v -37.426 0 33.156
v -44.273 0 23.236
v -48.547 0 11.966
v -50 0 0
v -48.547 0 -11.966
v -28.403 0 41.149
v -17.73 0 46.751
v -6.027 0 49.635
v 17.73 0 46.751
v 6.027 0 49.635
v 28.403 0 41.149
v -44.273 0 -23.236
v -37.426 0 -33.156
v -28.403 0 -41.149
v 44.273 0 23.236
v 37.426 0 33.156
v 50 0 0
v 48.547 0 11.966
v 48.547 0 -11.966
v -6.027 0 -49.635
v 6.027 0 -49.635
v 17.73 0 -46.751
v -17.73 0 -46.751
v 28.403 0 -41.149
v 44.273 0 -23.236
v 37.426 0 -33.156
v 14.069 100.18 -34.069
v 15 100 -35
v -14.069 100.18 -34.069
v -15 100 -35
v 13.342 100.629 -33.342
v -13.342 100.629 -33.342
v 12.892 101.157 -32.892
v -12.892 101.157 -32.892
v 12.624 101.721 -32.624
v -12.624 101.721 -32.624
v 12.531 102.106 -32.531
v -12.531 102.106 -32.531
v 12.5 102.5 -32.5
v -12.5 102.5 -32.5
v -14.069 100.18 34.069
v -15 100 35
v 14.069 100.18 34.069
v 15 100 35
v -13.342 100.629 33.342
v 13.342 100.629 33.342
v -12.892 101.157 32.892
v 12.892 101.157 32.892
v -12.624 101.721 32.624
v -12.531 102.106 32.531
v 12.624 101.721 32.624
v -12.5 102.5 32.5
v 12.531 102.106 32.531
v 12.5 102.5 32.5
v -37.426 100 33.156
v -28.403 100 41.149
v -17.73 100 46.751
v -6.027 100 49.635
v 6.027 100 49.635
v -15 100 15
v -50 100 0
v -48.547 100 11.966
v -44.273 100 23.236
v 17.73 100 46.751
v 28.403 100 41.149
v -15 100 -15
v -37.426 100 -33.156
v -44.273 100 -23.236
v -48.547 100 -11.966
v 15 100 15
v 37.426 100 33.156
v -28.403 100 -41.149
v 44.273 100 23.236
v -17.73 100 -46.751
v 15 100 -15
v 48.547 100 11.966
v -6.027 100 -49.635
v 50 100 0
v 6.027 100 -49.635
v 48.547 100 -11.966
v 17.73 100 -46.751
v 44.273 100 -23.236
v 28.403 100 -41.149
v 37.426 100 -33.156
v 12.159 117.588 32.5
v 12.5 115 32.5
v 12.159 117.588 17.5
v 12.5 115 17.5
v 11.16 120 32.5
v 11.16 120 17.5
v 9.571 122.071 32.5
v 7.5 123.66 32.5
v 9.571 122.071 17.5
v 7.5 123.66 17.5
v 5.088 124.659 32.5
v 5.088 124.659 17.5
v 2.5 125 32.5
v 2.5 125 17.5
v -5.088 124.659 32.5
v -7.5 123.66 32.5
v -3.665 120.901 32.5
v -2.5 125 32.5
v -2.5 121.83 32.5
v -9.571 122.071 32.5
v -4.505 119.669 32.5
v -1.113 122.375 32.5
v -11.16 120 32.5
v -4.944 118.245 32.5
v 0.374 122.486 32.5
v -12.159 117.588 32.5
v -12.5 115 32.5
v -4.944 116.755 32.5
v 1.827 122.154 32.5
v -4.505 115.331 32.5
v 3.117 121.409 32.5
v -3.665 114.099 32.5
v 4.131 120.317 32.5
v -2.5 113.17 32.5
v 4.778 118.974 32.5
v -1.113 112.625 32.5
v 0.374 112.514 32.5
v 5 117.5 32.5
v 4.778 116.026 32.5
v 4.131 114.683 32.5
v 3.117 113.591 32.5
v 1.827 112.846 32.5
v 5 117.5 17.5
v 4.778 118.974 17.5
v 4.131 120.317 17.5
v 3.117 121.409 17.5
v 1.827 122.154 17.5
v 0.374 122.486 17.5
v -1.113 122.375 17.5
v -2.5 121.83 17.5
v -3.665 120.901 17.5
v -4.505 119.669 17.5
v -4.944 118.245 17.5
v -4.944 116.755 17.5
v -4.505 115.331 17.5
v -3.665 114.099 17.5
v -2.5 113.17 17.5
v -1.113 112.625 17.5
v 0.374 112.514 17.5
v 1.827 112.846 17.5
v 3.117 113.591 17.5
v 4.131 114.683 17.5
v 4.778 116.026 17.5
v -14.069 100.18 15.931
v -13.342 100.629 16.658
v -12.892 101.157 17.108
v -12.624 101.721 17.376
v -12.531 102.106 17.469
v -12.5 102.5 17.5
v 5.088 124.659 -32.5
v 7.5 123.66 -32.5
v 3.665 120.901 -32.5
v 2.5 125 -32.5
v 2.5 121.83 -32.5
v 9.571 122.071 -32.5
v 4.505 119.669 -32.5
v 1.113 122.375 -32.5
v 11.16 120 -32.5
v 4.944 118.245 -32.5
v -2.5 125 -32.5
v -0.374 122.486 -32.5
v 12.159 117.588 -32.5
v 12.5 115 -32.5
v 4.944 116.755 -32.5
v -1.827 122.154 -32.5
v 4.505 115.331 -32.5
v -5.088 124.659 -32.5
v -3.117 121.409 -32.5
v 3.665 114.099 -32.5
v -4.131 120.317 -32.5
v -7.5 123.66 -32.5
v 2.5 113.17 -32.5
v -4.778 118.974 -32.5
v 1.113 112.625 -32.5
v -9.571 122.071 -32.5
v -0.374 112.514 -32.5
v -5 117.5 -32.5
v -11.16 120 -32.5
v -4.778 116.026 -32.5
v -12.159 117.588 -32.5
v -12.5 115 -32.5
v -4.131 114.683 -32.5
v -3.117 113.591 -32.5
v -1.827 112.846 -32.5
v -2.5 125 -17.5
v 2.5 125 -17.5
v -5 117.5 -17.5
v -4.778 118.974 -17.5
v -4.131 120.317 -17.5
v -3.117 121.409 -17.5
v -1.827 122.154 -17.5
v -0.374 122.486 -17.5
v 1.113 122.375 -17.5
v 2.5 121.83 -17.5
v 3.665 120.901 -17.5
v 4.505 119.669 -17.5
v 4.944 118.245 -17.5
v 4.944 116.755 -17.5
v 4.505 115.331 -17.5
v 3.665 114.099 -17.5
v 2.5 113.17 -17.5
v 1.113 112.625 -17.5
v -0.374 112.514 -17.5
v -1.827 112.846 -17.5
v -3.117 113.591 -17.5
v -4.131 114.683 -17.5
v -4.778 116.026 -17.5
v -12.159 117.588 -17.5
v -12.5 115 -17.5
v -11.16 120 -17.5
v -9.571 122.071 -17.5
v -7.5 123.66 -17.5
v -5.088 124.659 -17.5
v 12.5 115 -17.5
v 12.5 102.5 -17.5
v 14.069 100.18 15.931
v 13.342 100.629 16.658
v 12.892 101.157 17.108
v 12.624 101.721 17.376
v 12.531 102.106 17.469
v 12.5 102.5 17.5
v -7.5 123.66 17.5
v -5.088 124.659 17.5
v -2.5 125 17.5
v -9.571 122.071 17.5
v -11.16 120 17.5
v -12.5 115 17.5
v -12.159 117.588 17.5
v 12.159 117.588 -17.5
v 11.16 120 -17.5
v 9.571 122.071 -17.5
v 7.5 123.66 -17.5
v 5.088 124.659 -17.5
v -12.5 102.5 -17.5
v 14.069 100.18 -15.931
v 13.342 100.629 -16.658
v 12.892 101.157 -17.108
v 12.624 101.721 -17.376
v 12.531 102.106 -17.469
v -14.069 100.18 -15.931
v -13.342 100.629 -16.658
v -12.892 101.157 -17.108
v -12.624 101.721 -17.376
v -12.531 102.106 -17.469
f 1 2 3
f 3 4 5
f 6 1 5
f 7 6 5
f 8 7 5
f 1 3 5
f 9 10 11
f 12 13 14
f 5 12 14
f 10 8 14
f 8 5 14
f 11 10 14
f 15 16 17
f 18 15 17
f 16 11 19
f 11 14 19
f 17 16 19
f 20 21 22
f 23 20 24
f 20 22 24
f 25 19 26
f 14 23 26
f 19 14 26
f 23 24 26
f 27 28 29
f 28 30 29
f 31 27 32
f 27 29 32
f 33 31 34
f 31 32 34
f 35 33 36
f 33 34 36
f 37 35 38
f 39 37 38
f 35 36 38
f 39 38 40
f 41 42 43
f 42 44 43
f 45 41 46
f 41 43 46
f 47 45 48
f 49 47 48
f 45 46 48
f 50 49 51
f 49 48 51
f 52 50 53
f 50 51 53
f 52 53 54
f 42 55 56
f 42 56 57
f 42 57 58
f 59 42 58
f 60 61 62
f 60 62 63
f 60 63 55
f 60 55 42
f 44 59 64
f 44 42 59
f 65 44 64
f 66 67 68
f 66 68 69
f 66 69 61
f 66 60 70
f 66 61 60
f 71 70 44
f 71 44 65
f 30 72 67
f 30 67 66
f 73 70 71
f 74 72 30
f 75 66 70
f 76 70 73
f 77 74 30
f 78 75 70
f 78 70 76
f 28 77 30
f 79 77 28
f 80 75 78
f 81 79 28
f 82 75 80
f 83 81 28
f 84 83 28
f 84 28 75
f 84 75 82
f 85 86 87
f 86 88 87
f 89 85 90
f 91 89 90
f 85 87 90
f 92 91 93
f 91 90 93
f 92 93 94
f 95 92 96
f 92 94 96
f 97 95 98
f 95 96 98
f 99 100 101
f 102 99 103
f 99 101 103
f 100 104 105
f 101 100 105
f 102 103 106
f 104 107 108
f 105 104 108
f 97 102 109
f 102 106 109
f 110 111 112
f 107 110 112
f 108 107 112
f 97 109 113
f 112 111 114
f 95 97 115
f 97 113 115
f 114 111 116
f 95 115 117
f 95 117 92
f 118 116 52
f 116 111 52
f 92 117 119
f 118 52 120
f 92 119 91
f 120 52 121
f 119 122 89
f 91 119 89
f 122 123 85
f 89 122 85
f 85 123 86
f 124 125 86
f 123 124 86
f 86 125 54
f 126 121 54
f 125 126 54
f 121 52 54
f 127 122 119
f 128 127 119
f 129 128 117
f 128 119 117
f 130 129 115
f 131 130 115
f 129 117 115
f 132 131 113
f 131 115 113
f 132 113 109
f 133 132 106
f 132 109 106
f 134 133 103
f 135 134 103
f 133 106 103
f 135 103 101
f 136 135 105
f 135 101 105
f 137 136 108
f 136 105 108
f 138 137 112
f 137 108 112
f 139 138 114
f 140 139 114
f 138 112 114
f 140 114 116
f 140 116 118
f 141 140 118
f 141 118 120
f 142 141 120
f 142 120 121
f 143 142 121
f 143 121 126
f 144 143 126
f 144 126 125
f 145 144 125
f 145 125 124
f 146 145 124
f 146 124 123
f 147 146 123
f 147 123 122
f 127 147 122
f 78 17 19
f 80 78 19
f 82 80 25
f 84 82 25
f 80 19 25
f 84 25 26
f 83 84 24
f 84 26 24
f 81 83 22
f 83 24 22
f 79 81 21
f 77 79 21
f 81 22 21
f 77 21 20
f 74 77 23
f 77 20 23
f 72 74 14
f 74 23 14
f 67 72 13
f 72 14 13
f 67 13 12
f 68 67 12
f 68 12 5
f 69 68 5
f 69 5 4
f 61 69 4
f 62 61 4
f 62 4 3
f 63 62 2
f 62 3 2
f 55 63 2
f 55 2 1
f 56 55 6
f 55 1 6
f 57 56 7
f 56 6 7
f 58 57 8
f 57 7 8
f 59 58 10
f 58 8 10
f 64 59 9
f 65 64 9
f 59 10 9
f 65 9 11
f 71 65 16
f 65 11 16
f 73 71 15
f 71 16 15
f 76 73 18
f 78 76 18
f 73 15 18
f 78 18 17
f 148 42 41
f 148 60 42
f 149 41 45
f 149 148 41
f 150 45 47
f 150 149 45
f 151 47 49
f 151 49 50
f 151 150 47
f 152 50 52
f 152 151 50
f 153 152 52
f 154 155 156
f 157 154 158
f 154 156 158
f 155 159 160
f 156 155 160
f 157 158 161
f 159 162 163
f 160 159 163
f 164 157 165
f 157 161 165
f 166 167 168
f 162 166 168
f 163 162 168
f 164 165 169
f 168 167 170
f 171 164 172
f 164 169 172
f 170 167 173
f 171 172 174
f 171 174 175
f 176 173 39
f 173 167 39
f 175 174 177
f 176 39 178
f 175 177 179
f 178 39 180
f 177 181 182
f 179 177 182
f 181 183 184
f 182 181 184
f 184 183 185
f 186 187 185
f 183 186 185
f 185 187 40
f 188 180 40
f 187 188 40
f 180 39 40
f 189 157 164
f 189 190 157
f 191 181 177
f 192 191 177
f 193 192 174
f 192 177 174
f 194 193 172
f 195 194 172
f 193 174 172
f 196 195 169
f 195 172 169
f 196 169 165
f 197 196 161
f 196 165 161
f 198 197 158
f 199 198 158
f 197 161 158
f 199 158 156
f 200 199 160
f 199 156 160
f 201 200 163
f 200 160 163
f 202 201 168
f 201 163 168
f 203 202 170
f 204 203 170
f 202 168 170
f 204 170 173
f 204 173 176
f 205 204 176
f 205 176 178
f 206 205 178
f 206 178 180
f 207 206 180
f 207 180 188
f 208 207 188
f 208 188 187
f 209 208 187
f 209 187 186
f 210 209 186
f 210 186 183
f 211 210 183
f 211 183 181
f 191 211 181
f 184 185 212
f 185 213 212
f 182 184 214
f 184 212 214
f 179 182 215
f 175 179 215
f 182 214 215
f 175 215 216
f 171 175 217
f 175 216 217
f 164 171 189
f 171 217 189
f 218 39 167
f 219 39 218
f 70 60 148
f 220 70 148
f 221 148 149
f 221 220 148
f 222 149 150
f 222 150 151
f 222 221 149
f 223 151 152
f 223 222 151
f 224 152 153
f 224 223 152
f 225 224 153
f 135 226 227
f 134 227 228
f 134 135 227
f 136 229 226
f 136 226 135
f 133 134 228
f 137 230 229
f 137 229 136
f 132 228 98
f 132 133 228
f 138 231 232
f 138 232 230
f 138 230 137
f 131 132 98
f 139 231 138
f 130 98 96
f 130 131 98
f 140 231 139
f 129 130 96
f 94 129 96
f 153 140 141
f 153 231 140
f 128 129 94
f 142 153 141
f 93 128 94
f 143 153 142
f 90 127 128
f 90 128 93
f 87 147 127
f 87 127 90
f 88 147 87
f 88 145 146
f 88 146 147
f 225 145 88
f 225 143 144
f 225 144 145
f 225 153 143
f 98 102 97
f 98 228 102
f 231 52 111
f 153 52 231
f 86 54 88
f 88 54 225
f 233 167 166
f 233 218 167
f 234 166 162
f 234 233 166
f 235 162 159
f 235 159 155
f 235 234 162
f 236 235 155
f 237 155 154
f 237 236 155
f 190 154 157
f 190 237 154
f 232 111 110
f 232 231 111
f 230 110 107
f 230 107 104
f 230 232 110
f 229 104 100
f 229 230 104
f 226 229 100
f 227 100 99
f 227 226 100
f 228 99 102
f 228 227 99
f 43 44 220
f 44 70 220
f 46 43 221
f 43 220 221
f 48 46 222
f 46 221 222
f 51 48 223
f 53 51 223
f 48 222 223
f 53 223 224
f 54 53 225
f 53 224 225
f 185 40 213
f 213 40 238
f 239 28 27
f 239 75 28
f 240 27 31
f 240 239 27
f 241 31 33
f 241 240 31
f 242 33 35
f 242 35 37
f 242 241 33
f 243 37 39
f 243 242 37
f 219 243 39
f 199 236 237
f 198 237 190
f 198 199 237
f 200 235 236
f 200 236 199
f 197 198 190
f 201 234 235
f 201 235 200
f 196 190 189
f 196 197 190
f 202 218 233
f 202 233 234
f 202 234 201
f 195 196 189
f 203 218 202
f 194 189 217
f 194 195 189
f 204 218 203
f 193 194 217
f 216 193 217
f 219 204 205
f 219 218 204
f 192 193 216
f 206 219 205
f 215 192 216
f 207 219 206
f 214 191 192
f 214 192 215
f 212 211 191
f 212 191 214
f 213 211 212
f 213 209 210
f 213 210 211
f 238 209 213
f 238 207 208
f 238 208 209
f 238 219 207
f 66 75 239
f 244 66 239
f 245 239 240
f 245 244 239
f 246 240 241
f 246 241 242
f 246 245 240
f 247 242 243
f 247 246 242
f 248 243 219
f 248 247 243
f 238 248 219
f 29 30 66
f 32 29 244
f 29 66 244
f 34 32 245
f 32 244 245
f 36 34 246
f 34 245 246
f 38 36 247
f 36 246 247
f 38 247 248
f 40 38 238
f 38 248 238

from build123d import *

# Parameters (mm, degrees)
SKETCH1_R                = 50
BOSS_EXTRUDE1_DEPTH      = 100
SKETCH2_W                = 25
SKETCH2_H                = 15
BOSS_EXTRUDE2_DEPTH      = 25
FILLET1_R                = 2.5
FILLET2_R                = 10
SKETCH3_R                = 5
CUT_EXTRUDE1_DEPTH       = 25
CIRPATTERN1_COUNT        = 2
FILLET1_OF_CIRPATTERN1_R = 2.5
FILLET2_OF_CIRPATTERN1_R = 10


with BuildPart() as part:
    # Sketch1 → Boss-Extrude1 (new body)
    with BuildSketch(Plane(origin=(0, 0, 0), x_dir=(1, 0, 0), z_dir=(0, 1, 0))):
        Circle(SKETCH1_R)
    extrude(amount=BOSS_EXTRUDE1_DEPTH)

    # Sketch2 → Boss-Extrude2 (add)
    with BuildSketch(Plane(origin=(0, 100, 0), x_dir=(1, 0, 0), z_dir=(0, 1, 0))):
        with Locations((0, -25)):
            Rectangle(SKETCH2_W, SKETCH2_H)
    boss_extrude2 = extrude(amount=BOSS_EXTRUDE2_DEPTH)

    # Fillet1
    fillet1_edges = [part.edges().sort_by_distance(p)[0] for p in [
        (12.5, 100, 25),
        (0, 100, 17.5),
        (-12.5, 100, 25),
        (0, 100, 32.5),
    ]]
    fillet(fillet1_edges, radius=FILLET1_R)

    # Fillet2
    fillet2_edges = [part.edges().sort_by_distance(p)[0] for p in [
        (12.5, 125, 25),
        (-12.5, 125, 25),
    ]]
    fillet(fillet2_edges, radius=FILLET2_R)

    # Sketch3 → Cut-Extrude1 (cut)
    with BuildSketch(Plane.XY.offset(32.5)):
        with Locations((0, 117.5)):
            Circle(SKETCH3_R)
    cut_extrude1 = extrude(amount=-CUT_EXTRUDE1_DEPTH, mode=Mode.SUBTRACT)

    # CirPattern1: Boss-Extrude2, Cut-Extrude1 ×2 about axis
    cirpattern1_axis = Axis((0, 0, 0), (0, 1, 0))
    for i in range(1, CIRPATTERN1_COUNT):
        add(boss_extrude2.rotate(cirpattern1_axis, i * 360 / CIRPATTERN1_COUNT))
        add(cut_extrude1.rotate(cirpattern1_axis, i * 360 / CIRPATTERN1_COUNT), mode=Mode.SUBTRACT)

    # Fillet1 of CirPattern1
    fillet1_of_cirpattern1_edges = [part.edges().sort_by_distance(p)[0] for p in [
        (-12.5, 100, -25),
        (0, 100, -17.5),
        (12.5, 100, -25),
        (0, 100, -32.5),
    ]]
    fillet(fillet1_of_cirpattern1_edges, radius=FILLET1_OF_CIRPATTERN1_R)

    # Fillet2 of CirPattern1
    fillet2_of_cirpattern1_edges = [part.edges().sort_by_distance(p)[0] for p in [
        (-12.5, 125, -25),
        (12.5, 125, -25),
    ]]
    fillet(fillet2_of_cirpattern1_edges, radius=FILLET2_OF_CIRPATTERN1_R)


solid = part.part
